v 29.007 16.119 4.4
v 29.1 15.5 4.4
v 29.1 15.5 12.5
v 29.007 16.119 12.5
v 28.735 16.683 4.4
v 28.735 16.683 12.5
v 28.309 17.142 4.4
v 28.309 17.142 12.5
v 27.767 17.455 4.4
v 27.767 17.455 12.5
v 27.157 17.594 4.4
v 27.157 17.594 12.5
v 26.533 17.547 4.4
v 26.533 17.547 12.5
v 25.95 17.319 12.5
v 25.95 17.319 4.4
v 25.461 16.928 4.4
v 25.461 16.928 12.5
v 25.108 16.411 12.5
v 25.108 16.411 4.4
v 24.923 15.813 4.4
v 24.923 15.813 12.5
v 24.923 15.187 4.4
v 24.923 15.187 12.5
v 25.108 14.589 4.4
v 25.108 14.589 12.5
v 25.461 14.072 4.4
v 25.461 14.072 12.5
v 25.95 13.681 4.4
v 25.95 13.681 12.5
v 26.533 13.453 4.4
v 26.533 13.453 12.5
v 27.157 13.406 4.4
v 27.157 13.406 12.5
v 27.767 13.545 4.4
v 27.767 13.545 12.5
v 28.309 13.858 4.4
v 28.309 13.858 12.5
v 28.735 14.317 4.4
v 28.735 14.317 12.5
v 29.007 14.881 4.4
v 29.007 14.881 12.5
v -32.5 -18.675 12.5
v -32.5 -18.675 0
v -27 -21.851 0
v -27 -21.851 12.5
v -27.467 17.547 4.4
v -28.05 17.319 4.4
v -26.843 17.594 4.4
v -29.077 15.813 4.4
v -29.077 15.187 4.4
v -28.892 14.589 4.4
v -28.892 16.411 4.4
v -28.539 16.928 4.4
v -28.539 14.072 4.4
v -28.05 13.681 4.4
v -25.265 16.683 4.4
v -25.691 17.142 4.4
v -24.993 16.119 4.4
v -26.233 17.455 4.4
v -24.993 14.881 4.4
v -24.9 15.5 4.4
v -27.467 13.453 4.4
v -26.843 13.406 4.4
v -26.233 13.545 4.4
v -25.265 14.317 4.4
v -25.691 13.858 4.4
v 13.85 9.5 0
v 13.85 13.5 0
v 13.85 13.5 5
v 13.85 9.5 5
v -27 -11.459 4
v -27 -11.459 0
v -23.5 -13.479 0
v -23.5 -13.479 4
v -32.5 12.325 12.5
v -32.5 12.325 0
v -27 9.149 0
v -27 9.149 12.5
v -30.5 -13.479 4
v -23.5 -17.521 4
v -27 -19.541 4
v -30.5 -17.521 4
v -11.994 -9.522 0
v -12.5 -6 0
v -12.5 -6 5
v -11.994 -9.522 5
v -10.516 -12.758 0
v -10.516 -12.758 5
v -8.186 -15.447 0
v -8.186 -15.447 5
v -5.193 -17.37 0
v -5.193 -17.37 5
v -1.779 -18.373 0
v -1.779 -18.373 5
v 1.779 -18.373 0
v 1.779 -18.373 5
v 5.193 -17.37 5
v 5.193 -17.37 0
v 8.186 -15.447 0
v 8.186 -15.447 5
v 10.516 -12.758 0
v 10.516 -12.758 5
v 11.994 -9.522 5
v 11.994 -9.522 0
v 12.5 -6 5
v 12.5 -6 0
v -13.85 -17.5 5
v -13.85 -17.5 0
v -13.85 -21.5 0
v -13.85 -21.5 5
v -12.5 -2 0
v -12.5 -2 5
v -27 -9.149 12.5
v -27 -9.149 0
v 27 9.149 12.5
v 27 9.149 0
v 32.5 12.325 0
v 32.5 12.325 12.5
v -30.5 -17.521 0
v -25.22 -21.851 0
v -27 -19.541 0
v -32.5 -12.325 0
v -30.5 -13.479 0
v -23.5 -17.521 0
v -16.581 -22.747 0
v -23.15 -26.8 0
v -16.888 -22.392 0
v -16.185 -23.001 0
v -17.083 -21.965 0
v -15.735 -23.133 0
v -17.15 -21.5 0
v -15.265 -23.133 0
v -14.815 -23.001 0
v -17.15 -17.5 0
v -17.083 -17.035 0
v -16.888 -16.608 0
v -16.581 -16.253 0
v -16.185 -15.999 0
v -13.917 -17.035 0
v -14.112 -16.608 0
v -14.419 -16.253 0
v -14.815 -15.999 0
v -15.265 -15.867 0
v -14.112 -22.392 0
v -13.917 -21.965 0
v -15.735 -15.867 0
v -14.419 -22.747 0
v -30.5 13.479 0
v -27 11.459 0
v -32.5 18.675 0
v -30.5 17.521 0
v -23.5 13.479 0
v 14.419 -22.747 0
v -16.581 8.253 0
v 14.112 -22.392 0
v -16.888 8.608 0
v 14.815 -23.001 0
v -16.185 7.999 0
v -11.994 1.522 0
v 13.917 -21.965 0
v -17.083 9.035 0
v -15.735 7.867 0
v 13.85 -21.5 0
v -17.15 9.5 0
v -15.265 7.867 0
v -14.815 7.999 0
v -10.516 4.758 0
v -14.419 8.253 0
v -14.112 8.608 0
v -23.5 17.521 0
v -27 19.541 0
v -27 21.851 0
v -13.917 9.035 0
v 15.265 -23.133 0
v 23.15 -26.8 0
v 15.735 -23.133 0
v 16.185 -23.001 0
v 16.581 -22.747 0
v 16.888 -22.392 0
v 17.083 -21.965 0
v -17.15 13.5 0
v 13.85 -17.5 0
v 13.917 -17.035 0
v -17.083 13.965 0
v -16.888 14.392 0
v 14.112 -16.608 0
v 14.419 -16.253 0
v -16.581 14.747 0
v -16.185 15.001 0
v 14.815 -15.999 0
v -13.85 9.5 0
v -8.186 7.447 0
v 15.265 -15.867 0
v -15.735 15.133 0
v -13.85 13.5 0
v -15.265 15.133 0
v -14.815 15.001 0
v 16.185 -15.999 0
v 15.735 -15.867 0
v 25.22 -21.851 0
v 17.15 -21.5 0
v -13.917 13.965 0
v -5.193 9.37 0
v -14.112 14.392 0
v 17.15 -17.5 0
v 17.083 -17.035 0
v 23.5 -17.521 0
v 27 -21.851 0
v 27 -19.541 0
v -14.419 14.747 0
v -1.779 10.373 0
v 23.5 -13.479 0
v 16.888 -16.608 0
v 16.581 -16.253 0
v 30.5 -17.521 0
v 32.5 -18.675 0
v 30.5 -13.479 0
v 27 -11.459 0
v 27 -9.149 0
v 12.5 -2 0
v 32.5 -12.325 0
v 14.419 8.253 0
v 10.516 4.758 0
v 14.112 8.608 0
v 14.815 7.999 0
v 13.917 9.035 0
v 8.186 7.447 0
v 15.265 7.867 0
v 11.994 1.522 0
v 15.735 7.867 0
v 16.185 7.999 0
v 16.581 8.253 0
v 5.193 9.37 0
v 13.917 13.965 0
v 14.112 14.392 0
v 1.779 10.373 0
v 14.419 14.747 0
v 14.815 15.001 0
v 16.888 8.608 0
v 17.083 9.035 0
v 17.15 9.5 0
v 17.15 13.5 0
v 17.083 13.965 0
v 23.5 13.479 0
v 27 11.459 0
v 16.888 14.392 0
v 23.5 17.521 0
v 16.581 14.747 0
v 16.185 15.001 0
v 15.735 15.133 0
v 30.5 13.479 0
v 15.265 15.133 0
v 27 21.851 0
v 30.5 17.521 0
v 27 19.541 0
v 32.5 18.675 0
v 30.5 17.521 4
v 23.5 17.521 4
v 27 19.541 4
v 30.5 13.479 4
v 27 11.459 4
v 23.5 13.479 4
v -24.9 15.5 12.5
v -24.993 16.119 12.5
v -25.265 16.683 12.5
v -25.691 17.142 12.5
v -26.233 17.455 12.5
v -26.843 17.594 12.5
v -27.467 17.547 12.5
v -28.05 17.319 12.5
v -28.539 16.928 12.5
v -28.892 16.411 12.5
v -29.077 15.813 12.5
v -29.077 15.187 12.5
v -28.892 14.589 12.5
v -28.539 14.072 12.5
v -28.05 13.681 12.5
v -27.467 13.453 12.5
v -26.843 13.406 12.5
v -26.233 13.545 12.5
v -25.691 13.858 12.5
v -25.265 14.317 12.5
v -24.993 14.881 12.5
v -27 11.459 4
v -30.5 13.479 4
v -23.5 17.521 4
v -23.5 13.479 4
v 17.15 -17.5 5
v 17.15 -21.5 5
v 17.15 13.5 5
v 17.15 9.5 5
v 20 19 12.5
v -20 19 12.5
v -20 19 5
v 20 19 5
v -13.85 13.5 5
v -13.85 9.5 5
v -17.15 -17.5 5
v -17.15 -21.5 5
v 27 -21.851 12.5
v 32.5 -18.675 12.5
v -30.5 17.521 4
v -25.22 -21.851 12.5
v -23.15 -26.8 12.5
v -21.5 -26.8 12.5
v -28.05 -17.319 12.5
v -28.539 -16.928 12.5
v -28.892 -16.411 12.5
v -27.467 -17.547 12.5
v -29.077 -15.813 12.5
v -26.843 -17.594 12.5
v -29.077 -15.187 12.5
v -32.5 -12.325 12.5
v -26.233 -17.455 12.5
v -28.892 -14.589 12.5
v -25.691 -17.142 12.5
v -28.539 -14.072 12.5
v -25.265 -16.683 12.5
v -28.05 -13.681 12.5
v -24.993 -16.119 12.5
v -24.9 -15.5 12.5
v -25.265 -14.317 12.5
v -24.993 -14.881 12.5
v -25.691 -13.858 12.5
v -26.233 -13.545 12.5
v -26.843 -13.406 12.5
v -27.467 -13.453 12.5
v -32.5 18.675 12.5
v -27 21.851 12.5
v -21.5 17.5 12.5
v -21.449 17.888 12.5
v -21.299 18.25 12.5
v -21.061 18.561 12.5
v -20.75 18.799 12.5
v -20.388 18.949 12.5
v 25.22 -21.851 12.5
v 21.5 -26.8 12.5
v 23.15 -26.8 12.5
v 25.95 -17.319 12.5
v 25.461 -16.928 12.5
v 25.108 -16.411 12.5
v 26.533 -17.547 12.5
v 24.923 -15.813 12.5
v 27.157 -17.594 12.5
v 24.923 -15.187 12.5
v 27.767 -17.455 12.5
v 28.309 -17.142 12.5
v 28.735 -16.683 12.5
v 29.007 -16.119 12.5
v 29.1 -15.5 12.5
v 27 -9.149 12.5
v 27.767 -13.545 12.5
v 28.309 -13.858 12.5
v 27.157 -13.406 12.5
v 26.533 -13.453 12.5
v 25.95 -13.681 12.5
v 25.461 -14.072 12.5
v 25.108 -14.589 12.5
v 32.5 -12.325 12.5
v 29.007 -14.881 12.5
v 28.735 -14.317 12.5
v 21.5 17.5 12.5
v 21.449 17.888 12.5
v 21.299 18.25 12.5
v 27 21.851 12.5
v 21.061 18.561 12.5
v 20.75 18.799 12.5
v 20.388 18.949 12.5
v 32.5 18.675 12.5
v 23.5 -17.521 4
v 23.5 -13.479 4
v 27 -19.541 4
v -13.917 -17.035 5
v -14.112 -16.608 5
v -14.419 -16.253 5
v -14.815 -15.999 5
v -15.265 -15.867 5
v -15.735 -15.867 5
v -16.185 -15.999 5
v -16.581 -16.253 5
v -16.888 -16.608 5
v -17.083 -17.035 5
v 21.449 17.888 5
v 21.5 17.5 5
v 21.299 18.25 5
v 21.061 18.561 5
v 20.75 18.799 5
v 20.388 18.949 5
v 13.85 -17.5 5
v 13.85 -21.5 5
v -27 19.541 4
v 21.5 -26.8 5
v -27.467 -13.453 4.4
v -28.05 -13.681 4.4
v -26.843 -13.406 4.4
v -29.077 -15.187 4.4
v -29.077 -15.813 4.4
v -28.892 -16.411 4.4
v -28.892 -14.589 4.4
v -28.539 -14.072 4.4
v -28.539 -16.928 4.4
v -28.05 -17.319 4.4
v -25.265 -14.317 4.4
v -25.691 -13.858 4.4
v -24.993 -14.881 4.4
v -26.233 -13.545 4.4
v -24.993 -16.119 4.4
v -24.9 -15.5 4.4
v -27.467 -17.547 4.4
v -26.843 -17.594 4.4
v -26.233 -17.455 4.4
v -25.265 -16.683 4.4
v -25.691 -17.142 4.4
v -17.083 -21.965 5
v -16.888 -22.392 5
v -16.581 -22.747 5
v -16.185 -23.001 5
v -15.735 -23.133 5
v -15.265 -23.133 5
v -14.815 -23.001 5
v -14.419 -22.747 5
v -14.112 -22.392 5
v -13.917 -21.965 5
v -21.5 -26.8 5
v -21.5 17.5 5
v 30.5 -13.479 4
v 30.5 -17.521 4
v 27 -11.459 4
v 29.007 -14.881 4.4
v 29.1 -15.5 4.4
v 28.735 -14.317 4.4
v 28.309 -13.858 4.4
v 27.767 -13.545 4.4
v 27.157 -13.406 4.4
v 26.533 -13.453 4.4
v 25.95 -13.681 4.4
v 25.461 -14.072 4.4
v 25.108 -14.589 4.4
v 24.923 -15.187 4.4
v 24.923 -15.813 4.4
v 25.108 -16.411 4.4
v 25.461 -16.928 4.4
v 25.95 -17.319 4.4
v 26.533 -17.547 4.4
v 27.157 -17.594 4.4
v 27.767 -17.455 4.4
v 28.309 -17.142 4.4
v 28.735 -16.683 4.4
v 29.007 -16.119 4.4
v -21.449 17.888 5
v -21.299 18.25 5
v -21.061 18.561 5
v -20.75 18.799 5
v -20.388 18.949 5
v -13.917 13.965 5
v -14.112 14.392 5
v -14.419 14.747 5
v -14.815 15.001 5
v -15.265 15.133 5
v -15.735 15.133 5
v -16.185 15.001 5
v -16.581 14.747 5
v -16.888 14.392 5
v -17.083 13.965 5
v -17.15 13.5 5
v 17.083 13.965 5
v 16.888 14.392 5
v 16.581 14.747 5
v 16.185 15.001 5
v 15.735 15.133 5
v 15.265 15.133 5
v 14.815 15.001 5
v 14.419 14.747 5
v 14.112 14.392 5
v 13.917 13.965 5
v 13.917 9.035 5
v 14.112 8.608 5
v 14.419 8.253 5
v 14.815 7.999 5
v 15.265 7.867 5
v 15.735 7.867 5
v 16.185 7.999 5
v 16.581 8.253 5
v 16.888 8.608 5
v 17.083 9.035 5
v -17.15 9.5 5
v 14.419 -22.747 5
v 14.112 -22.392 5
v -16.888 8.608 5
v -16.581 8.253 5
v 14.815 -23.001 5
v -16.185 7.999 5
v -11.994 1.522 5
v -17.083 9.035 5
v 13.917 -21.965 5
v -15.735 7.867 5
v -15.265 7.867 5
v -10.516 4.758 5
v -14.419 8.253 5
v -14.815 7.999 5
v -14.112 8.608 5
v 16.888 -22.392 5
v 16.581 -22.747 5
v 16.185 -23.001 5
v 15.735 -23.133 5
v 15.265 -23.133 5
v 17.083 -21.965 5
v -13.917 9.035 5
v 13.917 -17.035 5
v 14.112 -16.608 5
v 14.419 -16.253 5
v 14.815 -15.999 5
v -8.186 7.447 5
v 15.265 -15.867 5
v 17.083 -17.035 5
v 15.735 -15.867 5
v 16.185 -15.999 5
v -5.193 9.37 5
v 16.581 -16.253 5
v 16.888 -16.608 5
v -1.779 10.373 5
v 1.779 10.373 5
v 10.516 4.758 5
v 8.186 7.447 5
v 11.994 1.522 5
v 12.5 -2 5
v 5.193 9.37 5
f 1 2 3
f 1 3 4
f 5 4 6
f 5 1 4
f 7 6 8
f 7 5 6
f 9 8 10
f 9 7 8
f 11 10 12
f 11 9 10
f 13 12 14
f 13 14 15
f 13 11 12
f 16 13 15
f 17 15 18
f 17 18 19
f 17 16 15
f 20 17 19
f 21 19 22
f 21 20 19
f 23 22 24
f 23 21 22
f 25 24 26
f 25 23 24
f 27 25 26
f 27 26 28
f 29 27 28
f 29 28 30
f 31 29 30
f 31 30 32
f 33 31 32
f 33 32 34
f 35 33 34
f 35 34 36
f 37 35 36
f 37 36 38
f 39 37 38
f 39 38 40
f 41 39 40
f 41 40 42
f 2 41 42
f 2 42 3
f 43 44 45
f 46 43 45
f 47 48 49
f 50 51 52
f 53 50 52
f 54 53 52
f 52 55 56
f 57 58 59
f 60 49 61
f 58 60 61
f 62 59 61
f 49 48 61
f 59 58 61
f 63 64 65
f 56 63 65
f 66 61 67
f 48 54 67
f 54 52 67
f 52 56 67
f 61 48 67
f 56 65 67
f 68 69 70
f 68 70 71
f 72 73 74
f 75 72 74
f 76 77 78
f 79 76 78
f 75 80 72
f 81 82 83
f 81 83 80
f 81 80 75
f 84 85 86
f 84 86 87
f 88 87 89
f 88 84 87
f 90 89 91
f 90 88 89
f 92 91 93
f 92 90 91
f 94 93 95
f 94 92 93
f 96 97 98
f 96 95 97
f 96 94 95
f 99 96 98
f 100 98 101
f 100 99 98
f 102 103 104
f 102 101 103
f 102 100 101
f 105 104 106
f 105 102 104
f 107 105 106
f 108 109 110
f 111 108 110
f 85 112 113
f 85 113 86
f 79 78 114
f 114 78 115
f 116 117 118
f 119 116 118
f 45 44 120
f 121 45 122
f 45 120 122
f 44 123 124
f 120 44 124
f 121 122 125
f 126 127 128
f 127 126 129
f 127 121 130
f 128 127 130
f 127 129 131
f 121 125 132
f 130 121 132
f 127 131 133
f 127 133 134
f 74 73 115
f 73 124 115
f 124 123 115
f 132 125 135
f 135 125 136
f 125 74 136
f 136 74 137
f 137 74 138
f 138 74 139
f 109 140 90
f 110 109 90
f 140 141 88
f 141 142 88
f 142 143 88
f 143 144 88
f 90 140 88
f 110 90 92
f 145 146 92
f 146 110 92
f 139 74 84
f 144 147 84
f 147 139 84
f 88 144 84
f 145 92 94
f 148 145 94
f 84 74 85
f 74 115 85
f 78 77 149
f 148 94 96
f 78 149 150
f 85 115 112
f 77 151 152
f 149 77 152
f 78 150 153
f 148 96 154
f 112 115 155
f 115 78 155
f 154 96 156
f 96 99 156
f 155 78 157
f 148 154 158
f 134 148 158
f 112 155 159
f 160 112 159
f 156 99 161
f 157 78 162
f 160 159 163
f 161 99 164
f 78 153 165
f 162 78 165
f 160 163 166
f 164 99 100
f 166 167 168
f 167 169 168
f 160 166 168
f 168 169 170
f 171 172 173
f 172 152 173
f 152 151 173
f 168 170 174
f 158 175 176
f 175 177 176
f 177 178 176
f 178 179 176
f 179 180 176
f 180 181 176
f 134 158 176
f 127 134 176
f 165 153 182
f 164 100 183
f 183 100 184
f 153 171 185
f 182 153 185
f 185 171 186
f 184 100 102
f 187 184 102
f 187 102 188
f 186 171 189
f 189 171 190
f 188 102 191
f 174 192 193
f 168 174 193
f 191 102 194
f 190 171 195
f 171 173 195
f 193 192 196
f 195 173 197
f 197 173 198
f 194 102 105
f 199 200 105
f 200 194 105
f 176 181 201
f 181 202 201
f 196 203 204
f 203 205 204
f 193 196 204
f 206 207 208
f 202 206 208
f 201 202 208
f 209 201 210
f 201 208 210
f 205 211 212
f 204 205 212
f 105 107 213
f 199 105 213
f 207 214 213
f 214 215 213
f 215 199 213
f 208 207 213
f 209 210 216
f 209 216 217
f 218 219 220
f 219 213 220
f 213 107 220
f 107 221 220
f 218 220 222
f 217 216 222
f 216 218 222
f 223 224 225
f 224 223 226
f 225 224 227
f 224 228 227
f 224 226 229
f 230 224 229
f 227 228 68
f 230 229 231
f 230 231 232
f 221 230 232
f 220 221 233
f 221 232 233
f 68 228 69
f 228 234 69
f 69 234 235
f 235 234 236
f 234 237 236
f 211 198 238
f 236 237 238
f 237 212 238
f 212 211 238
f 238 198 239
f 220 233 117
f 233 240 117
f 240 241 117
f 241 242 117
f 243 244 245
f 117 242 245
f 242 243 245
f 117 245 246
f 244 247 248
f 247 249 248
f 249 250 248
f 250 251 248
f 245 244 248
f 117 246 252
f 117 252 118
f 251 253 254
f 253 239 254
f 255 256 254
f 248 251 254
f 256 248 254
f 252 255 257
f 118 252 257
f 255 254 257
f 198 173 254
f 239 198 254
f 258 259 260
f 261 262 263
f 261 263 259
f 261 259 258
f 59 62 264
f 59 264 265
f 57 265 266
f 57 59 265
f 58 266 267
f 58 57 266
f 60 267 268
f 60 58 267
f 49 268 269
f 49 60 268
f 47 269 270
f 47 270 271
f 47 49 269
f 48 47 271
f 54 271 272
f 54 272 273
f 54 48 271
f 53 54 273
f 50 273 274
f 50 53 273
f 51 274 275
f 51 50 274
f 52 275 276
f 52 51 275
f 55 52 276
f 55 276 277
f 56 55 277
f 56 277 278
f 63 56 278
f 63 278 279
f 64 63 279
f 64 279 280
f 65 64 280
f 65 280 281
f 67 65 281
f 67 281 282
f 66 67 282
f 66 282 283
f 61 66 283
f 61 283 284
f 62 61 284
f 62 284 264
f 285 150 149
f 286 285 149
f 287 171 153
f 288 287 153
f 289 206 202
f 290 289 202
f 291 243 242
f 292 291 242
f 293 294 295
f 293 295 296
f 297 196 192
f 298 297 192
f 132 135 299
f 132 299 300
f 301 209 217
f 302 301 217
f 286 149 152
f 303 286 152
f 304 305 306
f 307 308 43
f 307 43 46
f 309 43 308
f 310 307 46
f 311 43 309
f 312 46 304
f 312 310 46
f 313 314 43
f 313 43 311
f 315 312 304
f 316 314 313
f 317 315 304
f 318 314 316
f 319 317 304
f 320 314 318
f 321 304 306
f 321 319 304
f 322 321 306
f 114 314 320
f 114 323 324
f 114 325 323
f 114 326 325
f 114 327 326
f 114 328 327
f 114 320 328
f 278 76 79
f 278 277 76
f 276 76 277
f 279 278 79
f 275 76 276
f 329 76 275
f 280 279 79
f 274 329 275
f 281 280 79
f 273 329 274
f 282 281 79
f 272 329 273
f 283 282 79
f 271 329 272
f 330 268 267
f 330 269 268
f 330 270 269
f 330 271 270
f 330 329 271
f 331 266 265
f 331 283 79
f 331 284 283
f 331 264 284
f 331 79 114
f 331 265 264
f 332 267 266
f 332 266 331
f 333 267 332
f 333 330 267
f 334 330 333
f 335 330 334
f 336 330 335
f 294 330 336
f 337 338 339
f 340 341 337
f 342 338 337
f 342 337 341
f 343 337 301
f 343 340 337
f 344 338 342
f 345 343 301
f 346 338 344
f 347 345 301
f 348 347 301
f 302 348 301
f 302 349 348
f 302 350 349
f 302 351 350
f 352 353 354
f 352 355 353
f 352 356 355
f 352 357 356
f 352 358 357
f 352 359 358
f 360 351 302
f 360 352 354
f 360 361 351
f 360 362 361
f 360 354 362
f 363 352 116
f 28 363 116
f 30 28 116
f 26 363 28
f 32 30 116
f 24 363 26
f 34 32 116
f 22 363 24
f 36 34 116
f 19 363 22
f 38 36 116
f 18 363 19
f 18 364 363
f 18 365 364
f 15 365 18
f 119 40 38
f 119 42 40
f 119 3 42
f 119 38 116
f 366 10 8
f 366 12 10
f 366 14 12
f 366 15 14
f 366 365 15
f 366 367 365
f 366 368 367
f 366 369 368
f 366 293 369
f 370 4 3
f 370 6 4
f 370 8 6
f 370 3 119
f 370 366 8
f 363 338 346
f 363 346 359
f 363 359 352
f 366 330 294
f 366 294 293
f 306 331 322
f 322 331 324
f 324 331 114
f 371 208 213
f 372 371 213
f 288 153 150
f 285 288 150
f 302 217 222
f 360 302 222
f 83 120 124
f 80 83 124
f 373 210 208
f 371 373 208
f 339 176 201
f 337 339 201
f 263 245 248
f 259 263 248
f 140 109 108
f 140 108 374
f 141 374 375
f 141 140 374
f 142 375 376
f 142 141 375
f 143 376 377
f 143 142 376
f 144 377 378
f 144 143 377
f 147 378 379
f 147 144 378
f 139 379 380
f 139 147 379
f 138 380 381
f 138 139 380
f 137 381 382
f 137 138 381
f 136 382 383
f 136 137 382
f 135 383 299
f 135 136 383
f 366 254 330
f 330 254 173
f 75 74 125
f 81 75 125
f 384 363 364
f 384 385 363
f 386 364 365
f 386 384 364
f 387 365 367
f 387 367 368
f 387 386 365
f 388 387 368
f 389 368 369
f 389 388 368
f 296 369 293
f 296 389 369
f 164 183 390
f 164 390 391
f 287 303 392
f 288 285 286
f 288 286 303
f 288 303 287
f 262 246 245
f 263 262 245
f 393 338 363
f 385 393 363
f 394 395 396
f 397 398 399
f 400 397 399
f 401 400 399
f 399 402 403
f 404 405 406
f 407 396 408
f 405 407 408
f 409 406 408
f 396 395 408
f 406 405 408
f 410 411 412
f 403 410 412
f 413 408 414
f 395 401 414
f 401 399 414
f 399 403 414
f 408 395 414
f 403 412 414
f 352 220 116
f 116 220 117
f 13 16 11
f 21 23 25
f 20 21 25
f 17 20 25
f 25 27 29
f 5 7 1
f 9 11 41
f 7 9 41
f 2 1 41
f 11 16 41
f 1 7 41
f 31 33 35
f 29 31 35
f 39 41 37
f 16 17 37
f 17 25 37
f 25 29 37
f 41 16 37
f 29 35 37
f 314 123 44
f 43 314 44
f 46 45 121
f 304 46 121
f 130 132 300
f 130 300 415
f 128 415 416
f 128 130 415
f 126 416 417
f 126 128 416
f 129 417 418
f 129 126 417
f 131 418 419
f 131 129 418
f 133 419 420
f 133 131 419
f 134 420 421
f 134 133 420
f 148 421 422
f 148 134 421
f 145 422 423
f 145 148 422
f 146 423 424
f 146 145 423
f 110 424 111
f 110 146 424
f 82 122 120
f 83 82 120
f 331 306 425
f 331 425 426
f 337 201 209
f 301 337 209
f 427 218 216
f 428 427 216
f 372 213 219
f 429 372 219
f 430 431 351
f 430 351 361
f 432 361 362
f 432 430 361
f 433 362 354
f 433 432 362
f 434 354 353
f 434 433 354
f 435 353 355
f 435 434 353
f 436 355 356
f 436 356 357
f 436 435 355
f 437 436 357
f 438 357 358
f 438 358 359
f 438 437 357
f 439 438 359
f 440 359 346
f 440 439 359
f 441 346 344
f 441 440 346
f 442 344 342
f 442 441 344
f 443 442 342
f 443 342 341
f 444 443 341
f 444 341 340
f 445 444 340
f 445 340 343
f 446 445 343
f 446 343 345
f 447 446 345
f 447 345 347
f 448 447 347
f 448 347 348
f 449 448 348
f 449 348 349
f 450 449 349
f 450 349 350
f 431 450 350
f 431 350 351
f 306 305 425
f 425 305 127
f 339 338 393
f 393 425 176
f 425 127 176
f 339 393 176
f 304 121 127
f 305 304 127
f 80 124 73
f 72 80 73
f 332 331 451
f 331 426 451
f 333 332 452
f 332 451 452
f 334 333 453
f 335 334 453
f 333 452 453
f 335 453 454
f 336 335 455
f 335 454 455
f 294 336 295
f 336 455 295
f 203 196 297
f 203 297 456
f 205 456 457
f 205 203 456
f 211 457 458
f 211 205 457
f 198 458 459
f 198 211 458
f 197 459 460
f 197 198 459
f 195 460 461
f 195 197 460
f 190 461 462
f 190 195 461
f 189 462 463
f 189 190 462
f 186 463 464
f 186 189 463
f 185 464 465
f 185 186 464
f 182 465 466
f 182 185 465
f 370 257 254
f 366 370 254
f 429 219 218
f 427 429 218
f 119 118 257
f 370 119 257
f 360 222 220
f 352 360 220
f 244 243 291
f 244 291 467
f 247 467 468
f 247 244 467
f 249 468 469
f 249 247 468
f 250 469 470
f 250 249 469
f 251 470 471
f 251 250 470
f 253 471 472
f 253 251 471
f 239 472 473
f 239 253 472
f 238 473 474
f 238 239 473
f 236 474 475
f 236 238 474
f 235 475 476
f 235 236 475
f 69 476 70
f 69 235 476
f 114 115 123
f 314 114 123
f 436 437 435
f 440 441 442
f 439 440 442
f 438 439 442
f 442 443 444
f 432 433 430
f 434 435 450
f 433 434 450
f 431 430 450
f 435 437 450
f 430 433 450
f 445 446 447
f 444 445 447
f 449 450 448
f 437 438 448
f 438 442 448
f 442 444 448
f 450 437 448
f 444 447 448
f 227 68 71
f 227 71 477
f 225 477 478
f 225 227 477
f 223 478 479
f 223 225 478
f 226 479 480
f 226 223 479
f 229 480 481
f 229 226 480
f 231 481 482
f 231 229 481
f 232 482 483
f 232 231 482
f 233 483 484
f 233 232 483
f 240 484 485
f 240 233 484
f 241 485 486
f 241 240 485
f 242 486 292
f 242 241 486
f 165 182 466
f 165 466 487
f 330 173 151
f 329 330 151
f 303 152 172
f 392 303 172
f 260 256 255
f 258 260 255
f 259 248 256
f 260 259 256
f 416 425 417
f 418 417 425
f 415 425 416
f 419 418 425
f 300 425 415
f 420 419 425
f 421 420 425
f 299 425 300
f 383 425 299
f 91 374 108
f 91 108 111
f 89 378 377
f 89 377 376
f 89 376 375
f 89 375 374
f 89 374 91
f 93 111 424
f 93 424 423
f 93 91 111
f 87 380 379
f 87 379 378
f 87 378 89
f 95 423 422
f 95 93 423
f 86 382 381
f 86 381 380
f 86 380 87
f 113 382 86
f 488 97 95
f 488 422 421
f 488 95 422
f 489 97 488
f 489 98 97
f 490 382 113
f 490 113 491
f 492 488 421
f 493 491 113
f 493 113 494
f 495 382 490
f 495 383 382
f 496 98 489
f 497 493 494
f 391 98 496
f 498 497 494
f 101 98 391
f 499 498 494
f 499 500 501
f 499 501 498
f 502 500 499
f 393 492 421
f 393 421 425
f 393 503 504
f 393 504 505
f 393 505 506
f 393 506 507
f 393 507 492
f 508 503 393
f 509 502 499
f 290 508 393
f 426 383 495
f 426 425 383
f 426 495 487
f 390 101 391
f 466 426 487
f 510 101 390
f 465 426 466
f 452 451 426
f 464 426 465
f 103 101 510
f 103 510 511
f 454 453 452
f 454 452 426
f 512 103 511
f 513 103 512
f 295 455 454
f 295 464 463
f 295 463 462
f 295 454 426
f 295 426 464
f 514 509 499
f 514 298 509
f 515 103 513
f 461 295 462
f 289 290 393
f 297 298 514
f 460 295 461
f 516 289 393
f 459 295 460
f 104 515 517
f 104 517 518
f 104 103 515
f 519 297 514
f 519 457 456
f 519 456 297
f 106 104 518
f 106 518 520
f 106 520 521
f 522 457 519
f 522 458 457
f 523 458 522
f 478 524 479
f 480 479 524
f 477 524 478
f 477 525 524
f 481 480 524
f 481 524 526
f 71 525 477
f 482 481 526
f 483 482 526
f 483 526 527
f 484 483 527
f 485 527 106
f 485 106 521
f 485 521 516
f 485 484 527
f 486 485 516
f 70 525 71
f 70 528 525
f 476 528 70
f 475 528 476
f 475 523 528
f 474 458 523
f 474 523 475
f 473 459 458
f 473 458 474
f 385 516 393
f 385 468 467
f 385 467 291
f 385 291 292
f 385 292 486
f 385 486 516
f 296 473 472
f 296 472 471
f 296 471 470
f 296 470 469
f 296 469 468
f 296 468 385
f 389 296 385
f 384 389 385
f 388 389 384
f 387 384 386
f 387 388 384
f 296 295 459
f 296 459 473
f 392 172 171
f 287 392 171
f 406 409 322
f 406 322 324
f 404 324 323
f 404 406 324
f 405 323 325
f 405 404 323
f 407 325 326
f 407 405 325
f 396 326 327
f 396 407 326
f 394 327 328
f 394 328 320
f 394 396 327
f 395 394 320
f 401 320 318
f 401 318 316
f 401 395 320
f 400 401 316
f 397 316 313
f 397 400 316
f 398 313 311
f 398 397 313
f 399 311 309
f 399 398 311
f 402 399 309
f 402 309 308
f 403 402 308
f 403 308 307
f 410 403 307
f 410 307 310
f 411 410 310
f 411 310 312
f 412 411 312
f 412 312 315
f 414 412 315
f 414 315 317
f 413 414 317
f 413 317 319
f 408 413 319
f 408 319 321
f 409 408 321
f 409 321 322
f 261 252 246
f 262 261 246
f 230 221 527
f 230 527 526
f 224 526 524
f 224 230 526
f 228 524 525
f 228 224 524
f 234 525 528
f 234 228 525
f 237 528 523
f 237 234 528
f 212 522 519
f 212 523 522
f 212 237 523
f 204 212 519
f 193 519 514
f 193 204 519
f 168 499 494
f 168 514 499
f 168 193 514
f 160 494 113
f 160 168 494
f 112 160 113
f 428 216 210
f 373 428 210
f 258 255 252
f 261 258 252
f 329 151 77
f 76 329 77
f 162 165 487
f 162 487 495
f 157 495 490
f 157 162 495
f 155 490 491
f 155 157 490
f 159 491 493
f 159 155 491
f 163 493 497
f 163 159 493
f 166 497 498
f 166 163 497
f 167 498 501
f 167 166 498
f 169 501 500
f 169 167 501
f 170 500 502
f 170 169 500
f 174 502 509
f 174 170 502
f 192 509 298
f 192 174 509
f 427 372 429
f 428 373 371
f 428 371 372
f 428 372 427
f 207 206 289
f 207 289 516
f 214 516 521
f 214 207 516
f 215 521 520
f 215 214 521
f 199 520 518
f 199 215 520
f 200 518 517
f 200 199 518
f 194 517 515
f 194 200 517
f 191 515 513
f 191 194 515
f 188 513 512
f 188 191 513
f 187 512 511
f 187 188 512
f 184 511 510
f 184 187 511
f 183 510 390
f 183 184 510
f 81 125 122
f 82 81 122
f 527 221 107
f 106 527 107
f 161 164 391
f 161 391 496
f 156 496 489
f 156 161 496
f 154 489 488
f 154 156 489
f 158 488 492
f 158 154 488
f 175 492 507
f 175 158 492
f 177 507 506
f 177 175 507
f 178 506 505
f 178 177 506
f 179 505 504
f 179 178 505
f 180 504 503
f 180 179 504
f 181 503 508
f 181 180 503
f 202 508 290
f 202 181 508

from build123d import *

# Parameters (mm, degrees)
SKETCH_R        = 2.1
PAD_DEPTH       = 12.5
SKETCH001_W     = 43
SKETCH001_H     = 45.8
POCKET_DEPTH    = 7.5
POCKET001_DEPTH = 4
FILLET_R        = 1.5
SKETCH003_R     = 2.1
PAD001_DEPTH    = 0.4


with BuildPart() as part:
    # Sketch → Pad (new body)
    with BuildSketch(Plane.XY):
        Polygon((-23.15, -26.8), (23.15, -26.8), (25.22, -21.850853), (27, -21.850853), (32.5, -18.675426), (32.5, -12.324574), (27, -9.149147), (27, 9.149147), (32.5, 12.324574), (32.5, 18.675426), (27, 21.850853), (-27, 21.850853), (-32.5, 18.675426), (-32.5, 12.324574), (-27, 9.149147), (-27, -9.149147), (-32.5, -12.324574), (-32.5, -18.675426), (-27, -21.850853), (-25.22, -21.850853), align=None)
        with Locations((-27, 15.5)):
            Circle(SKETCH_R, mode=Mode.SUBTRACT)
        with Locations((-27, -15.5)):
            Circle(SKETCH_R, mode=Mode.SUBTRACT)
        with Locations((27, 15.5)):
            Circle(SKETCH_R, mode=Mode.SUBTRACT)
        with Locations((27, -15.5)):
            Circle(SKETCH_R, mode=Mode.SUBTRACT)
        with BuildLine():
            ThreePointArc((12.5, -2), (0, 10.5), (-12.5, -2))
            Line((-12.5, -2), (-12.5, -6))
            ThreePointArc((-12.5, -6), (0, -18.5), (12.5, -6))
            Line((12.5, -2), (12.5, -6))
        make_face(mode=Mode.SUBTRACT)
        with BuildLine():
            ThreePointArc((-13.85, 13.5), (-15.5, 15.15), (-17.15, 13.5))
            Line((-17.15, 13.5), (-17.15, 9.5))
            ThreePointArc((-17.15, 9.5), (-15.5, 7.85), (-13.85, 9.5))
            Line((-13.85, 13.5), (-13.85, 9.5))
        make_face(mode=Mode.SUBTRACT)
        with BuildLine():
            ThreePointArc((17.15, 13.5), (15.5, 15.15), (13.85, 13.5))
            Line((13.85, 13.5), (13.85, 9.5))
            ThreePointArc((13.85, 9.5), (15.5, 7.85), (17.15, 9.5))
            Line((17.15, 13.5), (17.15, 9.5))
        make_face(mode=Mode.SUBTRACT)
        with BuildLine():
            ThreePointArc((-13.85, -17.5), (-15.5, -15.85), (-17.15, -17.5))
            Line((-17.15, -17.5), (-17.15, -21.5))
            ThreePointArc((-17.15, -21.5), (-15.5, -23.15), (-13.85, -21.5))
            Line((-13.85, -17.5), (-13.85, -21.5))
        make_face(mode=Mode.SUBTRACT)
        with BuildLine():
            ThreePointArc((17.15, -17.5), (15.5, -15.85), (13.85, -17.5))
            Line((13.85, -17.5), (13.85, -21.5))
            ThreePointArc((13.85, -21.5), (15.5, -23.15), (17.15, -21.5))
            Line((17.15, -17.5), (17.15, -21.5))
        make_face(mode=Mode.SUBTRACT)
    extrude(amount=PAD_DEPTH)

    # Sketch001 (on Face46 of Pad) → Pocket (cut)
    with BuildSketch(Plane.XY.offset(12.5)):
        with Locations((0, -3.9)):
            Rectangle(SKETCH001_W, SKETCH001_H)
    extrude(amount=-POCKET_DEPTH, mode=Mode.SUBTRACT)

    # Sketch002 (on Face4 of Pocket) → Pocket001 (cut)
    with BuildSketch(Plane(origin=(0, 0, 0), x_dir=(1, 0, 0), z_dir=(0, 0, -1))):
        Polygon((-23.5, 13.479274), (-23.5, 17.520726), (-27, 19.541452), (-30.5, 17.520726), (-30.5, 13.479274), (-27, 11.458548), align=None)
        Polygon((-23.5, -17.520726), (-23.5, -13.479274), (-27, -11.458548), (-30.5, -13.479274), (-30.5, -17.520726), (-27, -19.541452), align=None)
        Polygon((30.5, -17.520726), (30.5, -13.479274), (27, -11.458548), (23.5, -13.479274), (23.5, -17.520726), (27, -19.541452), align=None)
        Polygon((30.5, 13.479274), (30.5, 17.520726), (27, 19.541452), (23.5, 17.520726), (23.5, 13.479274), (27, 11.458548), align=None)
    extrude(amount=-POCKET001_DEPTH, mode=Mode.SUBTRACT)

    # Fillet
    fillet_edges = [part.edges().sort_by_distance(p)[0] for p in [
        (-21.5, 19, 8.75),
        (21.5, 19, 8.75),
    ]]
    fillet(fillet_edges, radius=FILLET_R)

    # Sketch003 (on Face33 of Fillet) → Pad001 (join)
    with BuildSketch(Plane(origin=(0, 0, 4), x_dir=(1, 0, 0), z_dir=(0, 0, -1))):
        with Locations((-27, 15.5)):
            Circle(SKETCH003_R)
        with Locations((27, 15.5)):
            Circle(SKETCH003_R)
        with Locations((-27, -15.5)):
            Circle(SKETCH003_R)
        with Locations((27, -15.5)):
            Circle(SKETCH003_R)
    extrude(amount=-PAD001_DEPTH)


solid = part.part
